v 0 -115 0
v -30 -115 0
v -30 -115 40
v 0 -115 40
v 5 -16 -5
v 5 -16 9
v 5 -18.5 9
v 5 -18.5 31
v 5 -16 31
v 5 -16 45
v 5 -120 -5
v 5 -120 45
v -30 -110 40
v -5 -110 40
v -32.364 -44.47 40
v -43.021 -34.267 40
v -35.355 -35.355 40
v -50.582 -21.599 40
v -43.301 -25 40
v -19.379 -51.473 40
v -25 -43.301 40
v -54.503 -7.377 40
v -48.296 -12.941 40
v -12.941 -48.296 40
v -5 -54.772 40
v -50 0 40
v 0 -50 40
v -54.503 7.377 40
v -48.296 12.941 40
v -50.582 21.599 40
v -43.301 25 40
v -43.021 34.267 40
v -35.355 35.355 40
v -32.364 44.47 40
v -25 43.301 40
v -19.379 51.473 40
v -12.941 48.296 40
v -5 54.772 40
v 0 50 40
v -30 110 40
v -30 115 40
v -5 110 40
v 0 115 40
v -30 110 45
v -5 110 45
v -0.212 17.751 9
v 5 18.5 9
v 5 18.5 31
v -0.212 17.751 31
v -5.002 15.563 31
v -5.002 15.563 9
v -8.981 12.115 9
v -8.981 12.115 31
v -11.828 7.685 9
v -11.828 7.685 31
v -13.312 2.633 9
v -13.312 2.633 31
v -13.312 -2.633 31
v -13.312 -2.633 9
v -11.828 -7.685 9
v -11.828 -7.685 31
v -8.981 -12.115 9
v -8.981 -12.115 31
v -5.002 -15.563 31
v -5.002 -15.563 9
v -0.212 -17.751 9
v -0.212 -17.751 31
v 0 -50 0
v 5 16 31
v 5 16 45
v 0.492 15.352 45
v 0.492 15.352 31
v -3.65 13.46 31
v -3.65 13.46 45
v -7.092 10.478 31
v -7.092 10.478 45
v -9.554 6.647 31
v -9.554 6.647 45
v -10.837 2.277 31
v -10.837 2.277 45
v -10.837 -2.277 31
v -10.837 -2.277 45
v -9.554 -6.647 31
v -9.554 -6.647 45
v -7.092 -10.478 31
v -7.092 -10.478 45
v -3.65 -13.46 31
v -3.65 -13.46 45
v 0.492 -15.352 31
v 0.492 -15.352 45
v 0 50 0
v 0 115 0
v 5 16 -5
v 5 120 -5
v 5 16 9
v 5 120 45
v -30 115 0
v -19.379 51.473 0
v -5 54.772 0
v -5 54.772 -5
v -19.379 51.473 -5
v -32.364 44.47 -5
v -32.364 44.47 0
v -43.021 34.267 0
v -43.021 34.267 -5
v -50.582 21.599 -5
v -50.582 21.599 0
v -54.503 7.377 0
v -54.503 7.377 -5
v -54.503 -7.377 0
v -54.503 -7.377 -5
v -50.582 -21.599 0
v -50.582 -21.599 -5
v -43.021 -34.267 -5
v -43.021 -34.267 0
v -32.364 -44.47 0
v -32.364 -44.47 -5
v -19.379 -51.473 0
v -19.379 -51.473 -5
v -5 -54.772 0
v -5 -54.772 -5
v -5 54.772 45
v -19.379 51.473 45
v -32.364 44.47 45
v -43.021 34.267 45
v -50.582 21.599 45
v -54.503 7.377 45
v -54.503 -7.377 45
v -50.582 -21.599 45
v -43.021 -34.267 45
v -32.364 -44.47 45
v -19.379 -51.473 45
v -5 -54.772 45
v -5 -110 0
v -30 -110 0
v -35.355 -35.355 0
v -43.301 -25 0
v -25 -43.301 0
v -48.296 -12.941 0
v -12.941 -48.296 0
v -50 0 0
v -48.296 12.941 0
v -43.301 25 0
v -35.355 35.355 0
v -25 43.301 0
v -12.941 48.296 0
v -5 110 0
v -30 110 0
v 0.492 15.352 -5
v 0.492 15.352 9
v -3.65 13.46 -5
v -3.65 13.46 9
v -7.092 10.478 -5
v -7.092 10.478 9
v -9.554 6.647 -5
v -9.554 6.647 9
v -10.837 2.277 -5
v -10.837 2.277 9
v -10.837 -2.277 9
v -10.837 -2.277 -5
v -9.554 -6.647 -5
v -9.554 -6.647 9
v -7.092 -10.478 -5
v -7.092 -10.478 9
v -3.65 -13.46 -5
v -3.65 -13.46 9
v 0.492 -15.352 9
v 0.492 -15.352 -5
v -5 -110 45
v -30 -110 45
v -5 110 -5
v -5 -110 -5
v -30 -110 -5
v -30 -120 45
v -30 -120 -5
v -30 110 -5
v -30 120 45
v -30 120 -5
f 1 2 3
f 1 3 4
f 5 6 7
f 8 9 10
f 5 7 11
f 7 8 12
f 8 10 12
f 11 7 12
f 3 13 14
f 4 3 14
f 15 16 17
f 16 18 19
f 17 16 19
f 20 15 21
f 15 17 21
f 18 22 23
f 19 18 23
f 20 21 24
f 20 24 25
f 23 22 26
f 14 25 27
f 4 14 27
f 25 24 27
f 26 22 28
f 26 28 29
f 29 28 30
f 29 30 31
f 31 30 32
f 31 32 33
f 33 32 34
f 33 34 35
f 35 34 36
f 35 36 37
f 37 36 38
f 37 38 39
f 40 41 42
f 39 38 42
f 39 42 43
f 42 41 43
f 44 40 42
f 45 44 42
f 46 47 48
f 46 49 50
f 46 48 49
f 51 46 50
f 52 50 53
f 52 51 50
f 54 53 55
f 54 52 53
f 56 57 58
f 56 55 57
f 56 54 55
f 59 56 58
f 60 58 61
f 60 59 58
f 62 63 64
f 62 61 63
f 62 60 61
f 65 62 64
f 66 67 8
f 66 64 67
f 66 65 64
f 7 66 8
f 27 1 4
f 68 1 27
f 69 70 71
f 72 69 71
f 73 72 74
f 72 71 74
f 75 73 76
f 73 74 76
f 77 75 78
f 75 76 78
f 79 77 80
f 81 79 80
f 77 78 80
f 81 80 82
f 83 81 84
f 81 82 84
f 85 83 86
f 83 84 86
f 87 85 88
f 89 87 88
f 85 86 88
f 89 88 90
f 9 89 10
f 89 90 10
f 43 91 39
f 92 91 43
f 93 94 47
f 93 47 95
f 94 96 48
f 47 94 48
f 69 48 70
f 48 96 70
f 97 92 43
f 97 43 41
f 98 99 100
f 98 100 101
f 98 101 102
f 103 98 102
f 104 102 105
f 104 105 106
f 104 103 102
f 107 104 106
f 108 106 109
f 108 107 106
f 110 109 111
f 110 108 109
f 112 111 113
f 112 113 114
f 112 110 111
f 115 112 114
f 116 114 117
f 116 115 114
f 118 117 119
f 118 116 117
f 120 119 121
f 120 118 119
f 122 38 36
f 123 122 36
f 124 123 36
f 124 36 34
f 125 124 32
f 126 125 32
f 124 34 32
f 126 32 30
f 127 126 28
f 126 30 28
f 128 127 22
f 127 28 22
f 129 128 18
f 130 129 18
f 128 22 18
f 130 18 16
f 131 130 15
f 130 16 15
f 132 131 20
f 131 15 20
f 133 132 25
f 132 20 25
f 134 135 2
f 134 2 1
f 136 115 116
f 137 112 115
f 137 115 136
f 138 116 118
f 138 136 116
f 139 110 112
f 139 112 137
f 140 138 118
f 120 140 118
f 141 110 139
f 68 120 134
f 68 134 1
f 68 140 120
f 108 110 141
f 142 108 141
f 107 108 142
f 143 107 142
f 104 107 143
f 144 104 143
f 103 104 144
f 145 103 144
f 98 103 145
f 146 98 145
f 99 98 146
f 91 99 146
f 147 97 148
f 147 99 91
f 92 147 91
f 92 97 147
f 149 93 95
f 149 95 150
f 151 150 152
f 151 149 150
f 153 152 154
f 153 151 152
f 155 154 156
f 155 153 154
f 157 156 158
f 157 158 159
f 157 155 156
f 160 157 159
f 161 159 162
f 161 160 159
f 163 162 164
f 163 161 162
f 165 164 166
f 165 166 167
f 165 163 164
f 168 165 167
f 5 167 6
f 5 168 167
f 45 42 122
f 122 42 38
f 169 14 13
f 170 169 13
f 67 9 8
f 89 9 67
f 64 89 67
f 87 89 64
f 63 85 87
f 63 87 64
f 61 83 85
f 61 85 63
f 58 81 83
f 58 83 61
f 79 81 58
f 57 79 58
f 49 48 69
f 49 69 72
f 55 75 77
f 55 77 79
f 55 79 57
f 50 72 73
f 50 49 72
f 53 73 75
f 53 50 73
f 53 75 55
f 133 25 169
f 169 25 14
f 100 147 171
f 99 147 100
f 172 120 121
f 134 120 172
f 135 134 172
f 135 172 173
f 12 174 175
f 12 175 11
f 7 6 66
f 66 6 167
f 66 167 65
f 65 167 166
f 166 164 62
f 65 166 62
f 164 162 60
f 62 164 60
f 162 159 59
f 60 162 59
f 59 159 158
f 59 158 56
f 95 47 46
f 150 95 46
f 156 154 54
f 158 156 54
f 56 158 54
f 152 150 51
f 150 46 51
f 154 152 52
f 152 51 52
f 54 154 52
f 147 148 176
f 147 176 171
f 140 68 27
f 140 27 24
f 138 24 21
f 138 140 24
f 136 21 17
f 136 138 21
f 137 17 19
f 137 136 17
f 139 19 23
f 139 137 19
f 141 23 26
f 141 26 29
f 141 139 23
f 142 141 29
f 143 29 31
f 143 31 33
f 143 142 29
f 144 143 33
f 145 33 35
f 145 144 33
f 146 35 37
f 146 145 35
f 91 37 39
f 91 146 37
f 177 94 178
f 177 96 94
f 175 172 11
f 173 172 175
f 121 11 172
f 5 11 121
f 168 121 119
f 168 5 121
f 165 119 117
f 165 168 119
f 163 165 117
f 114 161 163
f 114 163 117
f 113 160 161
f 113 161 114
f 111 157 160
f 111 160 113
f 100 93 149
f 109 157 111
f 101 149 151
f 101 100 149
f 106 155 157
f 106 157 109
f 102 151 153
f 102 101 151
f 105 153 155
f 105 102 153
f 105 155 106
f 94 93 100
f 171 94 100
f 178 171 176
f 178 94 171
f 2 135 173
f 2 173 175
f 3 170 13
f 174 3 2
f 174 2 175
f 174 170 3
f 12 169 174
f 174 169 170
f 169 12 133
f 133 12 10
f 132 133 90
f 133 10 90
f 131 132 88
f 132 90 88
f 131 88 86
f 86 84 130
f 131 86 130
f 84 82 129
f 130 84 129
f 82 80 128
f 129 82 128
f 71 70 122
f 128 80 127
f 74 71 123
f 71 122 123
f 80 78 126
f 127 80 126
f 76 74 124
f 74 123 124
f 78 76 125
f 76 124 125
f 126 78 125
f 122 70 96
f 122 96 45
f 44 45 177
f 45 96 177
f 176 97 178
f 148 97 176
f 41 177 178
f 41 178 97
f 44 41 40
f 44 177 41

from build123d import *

# Parameters (mm, degrees)
SALIENTE_EXTRUIR1_DEPTH = 40
SALIENTE_EXTRUIR2_DEPTH = 5
SALIENTE_EXTRUIR3_DEPTH = 50
SALIENTE_EXTRUIR4_DEPTH = 14


with BuildPart() as part:
    # Croquis1 → Saliente-Extruir1 (new body)
    with BuildSketch(Plane.XY):
        with BuildLine():
            Line((0, 50), (0, 115))
            Line((0, 115), (-30, 115))
            Line((-30, 115), (-30, 120))
            Line((-30, 120), (5, 120))
            Line((5, 120), (5, 45))
            Line((5, 45), (0, 45))
            ThreePointArc((0, 45), (-45, 0), (0, -45))
            Line((0, -45), (5, -45))
            Line((5, -45), (5, -120))
            Line((5, -120), (-30, -120))
            Line((-30, -120), (-30, -115))
            Line((-30, -115), (0, -115))
            Line((0, -115), (0, -50))
            ThreePointArc((0, -50), (-50, 0), (0, 50))
        make_face()
    extrude(amount=SALIENTE_EXTRUIR1_DEPTH)

    # Croquis2 → Saliente-Extruir2 (add)
    with BuildSketch(Plane.XY.offset(40)):
        with BuildLine():
            Line((5, 120), (-30, 120))
            Line((-30, 120), (-30, 110))
            Line((-30, 110), (-5, 110))
            Line((-5, 110), (-5, 54.772255751))
            ThreePointArc((-5, 54.772255751), (-55, 0), (-5, -54.772255751))
            Line((-5, -54.772255751), (-5, -110))
            Line((-5, -110), (-30, -110))
            Line((-30, -110), (-30, -120))
            Line((-30, -120), (5, -120))
            Line((5, -120), (5, -45))
            Line((5, -45), (0, -45))
            ThreePointArc((0, -45), (-45, 0), (0, 45))
            Line((0, 45), (5, 45))
            Line((5, 45), (5, 120))
        make_face()
    saliente_extruir2 = extrude(amount=SALIENTE_EXTRUIR2_DEPTH)

    # Simetría1: Saliente-Extruir2 across plane
    add(saliente_extruir2.mirror(Plane.XY.offset(20)))

    # Croquis3 → Saliente-Extruir3 (add)
    with BuildSketch(Plane(origin=(0, 0, -5), x_dir=(-1, 0, 0), z_dir=(0, 0, -1))):
        with BuildLine():
            Line((-5, 45.111824995), (-5, 18.5))
            ThreePointArc((-5, 18.5), (13.5, 0), (-5, -18.5))
            Line((-5, -18.5), (-5, -44.72135955))
            Line((-5, -44.72135955), (-5, -45))
            Line((-5, -45), (0, -45))
            ThreePointArc((0, -45), (45, 0), (0, 45))
            Line((0, 45), (-5, 45.111824995))
        make_face()
    extrude(amount=-SALIENTE_EXTRUIR3_DEPTH)

    # Croquis4 → Saliente-Extruir4 (add)
    with BuildSketch(Plane(origin=(0, 0, -5), x_dir=(-1, 0, 0), z_dir=(0, 0, -1))):
        with BuildLine():
            Line((-5, 18.5), (-5, 16))
            ThreePointArc((-5, 16), (11, 0), (-5, -16))
            Line((-5, -16), (-5, -18.5))
            ThreePointArc((-5, -18.5), (13.5, 0), (-5, 18.5))
        make_face()
    saliente_extruir4 = extrude(amount=-SALIENTE_EXTRUIR4_DEPTH)

    # Simetría2: Saliente-Extruir4 across plane
    add(saliente_extruir4.mirror(Plane.XY.offset(20)))


solid = part.part
